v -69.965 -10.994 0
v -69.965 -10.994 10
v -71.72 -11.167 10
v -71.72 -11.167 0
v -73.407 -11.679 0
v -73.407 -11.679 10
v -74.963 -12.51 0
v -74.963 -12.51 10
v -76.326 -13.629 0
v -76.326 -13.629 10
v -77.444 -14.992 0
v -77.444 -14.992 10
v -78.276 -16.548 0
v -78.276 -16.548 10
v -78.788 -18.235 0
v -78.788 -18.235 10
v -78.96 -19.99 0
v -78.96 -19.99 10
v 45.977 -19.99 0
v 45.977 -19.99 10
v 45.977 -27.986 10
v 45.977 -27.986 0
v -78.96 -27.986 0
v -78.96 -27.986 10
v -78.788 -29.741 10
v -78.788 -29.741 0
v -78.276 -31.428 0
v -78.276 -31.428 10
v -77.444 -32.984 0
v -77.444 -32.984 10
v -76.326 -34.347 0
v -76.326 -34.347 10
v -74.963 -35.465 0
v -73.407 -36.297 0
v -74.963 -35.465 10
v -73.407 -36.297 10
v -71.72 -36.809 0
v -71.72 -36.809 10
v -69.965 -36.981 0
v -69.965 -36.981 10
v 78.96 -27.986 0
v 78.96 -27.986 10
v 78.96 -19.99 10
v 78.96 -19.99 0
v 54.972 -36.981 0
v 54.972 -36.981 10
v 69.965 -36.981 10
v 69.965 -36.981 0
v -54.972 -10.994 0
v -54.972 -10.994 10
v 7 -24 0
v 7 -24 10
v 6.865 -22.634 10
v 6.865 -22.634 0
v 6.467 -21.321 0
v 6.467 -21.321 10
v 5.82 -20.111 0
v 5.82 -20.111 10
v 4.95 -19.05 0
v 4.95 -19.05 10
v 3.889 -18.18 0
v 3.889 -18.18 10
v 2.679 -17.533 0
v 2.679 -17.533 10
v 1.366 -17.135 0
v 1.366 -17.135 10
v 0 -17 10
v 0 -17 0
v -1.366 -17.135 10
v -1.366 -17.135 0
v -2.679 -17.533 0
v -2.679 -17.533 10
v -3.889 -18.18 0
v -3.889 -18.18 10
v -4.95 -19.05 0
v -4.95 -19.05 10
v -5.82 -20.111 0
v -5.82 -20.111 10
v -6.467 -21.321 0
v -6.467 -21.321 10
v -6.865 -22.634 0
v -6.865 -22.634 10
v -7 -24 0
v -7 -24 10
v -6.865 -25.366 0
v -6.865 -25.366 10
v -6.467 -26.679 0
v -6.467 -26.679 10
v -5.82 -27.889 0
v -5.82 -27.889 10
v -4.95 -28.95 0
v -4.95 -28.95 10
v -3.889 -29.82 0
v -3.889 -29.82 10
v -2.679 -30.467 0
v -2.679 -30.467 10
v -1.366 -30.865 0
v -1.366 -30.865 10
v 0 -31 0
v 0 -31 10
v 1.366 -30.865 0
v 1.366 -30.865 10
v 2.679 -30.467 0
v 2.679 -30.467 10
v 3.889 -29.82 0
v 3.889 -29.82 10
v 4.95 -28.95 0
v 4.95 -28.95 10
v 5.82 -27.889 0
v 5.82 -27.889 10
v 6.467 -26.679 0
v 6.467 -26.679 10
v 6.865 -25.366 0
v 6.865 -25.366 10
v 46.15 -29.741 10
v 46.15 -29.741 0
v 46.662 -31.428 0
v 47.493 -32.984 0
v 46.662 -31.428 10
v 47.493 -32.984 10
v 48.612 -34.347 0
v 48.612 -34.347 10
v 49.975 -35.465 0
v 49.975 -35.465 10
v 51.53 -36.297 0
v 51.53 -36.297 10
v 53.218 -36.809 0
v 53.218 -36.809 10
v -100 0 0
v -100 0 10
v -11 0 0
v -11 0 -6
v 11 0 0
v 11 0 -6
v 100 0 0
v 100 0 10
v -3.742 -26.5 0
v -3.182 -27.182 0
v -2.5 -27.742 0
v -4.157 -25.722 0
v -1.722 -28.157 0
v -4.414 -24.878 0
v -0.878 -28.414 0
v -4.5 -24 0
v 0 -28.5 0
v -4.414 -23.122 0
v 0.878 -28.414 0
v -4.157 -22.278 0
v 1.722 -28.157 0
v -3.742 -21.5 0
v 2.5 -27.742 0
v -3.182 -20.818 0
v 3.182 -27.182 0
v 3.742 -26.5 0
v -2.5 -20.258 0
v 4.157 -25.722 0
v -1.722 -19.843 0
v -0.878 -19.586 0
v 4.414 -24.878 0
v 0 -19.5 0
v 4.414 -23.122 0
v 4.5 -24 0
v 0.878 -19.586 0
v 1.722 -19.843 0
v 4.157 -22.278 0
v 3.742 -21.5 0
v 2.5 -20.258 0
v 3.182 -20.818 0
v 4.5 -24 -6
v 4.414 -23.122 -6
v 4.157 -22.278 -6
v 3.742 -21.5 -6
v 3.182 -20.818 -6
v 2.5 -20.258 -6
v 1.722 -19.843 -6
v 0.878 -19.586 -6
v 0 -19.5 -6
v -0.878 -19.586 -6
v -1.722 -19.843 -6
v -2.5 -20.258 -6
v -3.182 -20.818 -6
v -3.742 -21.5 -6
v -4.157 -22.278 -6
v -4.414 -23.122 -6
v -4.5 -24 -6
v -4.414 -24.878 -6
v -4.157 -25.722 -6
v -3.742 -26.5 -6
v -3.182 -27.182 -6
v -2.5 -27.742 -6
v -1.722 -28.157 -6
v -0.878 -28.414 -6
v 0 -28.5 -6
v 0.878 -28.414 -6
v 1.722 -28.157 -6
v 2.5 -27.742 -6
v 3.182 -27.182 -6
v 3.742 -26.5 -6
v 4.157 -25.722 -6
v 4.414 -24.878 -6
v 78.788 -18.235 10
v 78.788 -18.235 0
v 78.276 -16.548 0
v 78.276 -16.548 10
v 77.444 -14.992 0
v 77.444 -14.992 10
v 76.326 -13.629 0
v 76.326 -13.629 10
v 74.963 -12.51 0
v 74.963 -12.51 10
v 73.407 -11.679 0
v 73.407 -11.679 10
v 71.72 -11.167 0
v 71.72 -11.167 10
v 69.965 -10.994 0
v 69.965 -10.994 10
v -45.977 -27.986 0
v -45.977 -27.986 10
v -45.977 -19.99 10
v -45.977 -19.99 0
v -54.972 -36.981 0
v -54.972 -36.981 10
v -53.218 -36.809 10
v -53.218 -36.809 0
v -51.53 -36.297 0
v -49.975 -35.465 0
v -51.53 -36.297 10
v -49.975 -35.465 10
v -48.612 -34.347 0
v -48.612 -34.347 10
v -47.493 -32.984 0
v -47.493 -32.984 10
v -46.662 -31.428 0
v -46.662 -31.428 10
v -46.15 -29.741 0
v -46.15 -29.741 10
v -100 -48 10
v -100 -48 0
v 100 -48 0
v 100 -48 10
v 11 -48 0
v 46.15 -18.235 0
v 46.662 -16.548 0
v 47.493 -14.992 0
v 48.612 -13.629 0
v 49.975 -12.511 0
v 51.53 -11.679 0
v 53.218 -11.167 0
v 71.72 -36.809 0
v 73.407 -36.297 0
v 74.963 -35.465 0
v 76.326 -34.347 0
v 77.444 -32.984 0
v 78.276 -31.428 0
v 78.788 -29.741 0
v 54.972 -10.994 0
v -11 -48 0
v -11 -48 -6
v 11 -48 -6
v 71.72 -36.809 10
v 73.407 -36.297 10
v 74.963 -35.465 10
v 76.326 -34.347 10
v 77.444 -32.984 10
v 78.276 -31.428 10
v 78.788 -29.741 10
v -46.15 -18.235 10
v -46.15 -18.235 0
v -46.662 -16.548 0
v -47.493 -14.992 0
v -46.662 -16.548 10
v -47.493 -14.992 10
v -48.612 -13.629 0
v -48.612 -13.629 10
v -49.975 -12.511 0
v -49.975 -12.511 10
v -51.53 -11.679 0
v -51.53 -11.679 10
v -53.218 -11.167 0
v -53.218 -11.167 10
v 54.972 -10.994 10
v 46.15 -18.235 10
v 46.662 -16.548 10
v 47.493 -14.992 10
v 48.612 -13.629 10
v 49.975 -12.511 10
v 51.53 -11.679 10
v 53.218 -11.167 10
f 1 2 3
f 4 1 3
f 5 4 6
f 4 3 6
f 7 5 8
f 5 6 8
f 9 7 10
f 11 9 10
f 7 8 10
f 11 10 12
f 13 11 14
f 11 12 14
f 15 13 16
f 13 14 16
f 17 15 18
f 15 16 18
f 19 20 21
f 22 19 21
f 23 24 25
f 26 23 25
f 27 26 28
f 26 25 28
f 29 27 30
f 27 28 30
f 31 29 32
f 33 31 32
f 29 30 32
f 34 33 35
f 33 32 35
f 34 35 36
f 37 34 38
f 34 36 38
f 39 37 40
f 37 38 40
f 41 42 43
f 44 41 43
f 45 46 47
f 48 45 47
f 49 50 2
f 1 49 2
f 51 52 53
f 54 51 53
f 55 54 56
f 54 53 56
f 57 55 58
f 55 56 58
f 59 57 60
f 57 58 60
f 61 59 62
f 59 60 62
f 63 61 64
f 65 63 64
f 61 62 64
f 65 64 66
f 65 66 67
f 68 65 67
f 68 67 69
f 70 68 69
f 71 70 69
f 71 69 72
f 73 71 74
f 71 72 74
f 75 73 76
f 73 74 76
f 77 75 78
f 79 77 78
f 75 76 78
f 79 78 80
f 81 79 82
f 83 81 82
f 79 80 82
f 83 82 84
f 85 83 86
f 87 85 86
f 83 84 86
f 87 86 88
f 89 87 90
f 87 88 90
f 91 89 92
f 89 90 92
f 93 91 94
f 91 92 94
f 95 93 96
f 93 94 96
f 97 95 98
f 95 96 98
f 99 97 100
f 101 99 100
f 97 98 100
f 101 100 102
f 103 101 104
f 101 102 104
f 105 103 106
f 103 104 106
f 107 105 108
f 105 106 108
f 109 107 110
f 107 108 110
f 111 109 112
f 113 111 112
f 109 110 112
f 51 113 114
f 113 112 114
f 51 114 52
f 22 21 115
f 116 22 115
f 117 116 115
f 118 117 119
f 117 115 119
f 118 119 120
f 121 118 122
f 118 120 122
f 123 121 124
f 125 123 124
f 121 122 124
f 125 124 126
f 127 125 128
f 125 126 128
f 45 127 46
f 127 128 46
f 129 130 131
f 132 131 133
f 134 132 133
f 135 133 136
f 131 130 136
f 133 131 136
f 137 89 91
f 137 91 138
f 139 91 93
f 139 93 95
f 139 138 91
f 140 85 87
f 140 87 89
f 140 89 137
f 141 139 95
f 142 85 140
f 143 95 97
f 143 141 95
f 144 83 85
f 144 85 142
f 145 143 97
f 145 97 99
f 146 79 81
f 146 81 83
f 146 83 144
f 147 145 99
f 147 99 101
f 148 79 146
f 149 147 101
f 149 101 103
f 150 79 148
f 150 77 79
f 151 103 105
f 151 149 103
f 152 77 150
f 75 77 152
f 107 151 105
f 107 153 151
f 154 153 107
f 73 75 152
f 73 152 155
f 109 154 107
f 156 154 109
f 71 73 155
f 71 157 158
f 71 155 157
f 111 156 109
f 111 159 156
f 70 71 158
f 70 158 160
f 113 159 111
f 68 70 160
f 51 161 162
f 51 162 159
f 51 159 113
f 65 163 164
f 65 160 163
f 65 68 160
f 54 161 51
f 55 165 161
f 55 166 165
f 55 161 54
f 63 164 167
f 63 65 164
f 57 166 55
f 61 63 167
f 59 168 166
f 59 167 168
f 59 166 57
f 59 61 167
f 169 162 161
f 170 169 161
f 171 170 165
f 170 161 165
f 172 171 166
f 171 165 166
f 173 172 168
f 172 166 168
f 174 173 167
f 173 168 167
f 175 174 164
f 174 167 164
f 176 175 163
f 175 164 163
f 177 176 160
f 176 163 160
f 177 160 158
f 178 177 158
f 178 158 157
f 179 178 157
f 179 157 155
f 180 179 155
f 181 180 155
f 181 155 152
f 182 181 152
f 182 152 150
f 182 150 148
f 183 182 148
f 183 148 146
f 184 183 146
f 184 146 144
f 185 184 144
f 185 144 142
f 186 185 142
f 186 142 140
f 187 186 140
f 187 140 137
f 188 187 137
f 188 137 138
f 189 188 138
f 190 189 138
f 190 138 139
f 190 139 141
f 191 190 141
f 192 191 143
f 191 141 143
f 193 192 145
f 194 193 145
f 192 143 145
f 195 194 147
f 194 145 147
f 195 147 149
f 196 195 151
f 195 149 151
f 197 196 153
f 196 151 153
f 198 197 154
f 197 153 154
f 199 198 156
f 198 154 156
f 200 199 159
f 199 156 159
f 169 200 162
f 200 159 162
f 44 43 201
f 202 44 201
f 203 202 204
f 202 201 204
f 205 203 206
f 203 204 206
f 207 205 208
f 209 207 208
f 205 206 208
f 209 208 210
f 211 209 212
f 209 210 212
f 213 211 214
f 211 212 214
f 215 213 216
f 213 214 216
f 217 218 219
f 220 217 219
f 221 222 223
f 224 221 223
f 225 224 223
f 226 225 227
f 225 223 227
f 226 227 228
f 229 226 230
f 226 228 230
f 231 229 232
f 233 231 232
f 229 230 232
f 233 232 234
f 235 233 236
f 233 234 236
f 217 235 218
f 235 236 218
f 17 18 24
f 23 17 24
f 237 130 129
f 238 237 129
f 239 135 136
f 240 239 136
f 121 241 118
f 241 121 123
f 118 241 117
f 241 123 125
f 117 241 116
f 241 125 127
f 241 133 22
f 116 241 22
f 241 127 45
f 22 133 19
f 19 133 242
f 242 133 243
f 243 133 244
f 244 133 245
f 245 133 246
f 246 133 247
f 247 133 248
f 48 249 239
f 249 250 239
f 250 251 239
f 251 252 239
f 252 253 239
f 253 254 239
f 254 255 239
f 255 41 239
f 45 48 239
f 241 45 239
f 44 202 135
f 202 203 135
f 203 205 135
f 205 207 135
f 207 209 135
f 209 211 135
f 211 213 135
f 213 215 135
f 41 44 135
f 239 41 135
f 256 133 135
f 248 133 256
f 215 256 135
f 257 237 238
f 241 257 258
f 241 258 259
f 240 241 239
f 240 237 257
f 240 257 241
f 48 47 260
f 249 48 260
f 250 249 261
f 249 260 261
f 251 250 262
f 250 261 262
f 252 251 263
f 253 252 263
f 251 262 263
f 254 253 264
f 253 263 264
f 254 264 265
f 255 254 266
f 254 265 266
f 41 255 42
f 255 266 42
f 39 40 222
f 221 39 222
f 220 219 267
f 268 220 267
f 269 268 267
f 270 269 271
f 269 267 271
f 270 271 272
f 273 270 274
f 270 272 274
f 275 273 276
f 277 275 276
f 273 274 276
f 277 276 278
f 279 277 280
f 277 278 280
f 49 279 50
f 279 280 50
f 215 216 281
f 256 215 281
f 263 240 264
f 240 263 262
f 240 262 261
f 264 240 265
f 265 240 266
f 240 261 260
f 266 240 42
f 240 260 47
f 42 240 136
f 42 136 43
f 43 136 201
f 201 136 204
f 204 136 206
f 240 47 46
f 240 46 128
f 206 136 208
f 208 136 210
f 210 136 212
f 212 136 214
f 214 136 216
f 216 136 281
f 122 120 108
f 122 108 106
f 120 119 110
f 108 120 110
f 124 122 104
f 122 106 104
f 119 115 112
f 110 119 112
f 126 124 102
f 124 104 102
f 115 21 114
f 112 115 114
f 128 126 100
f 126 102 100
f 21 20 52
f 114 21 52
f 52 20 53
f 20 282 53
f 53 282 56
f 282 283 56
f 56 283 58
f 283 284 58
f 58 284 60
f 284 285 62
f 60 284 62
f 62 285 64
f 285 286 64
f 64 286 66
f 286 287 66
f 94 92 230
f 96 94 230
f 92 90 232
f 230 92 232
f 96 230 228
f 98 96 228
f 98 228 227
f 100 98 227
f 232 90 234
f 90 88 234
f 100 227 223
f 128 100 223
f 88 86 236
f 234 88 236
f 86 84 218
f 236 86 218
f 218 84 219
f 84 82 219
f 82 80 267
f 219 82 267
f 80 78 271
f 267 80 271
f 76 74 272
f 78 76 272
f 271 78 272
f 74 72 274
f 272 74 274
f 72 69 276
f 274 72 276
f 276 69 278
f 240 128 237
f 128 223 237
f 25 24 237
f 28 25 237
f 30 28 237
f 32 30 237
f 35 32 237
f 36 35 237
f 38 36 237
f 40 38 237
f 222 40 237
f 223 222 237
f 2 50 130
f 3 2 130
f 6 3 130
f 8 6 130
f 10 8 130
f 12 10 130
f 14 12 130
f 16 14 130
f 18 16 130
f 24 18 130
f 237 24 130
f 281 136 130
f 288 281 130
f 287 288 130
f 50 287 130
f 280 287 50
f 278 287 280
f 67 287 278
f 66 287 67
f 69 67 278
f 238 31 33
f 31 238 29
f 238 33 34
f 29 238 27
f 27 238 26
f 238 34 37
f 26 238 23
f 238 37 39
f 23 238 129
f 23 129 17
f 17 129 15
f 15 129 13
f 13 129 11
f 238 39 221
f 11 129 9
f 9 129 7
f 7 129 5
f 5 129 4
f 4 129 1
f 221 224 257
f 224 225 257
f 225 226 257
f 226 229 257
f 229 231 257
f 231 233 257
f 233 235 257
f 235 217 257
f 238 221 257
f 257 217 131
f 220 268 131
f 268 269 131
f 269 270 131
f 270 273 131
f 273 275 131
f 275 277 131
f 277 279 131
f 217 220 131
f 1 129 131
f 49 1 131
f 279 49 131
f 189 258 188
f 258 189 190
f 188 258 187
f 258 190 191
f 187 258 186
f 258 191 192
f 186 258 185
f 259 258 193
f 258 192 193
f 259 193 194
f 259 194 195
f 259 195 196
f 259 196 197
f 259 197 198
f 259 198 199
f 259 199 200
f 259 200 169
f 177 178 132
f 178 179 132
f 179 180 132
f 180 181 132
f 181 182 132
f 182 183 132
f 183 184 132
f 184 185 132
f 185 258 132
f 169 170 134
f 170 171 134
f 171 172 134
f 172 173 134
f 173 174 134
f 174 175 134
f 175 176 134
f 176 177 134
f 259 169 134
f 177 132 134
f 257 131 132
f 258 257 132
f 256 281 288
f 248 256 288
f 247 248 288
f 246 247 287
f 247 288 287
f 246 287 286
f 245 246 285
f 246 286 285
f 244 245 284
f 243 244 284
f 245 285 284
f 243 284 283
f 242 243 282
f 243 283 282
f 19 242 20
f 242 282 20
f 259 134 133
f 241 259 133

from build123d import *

# Parameters (mm, degrees)
F1_DEPTH = 48
F3_DEPTH = 10
F2_R     = 7
F2_R_2   = 4.5
F4_DEPTH = 10
F5_DEPTH = 25


with BuildPart() as f1:
    # F0 (on Front) → F1 (new body)
    with BuildSketch(Plane.XZ):
        Polygon((-100, 0), (-11, 0), (-11, -6), (11, -6), (11, 0), (100, 0), (100, 10), (-100, 10), align=None)
    extrude(amount=F1_DEPTH)

    # F2 (on face) → F3 (cut)
    with BuildSketch(Plane.XY.offset(10)):
        with BuildLine():
            Line((-78.960404, -19.989976), (-78.960404, -27.985966))
            ThreePointArc((-78.960404, -27.985966), (-76.325687, -34.346737), (-69.964915, -36.981455))
            Line((-69.964915, -36.981455), (-54.972433, -36.981455))
            ThreePointArc((-54.972433, -36.981455), (-48.611662, -34.346737), (-45.976944, -27.985966))
            Line((-45.976944, -27.985966), (-45.976944, -19.989976))
            ThreePointArc((-45.976944, -19.989976), (-48.611662, -13.629204), (-54.972433, -10.994487))
            Line((-54.972433, -10.994487), (-69.964915, -10.994487))
            ThreePointArc((-69.964915, -10.994487), (-76.325687, -13.629204), (-78.960404, -19.989976))
        make_face()
        with BuildLine():
            ThreePointArc((45.976944, -27.985966), (48.611662, -34.346737), (54.972433, -36.981455))
            Line((54.972433, -36.981455), (69.964915, -36.981455))
            ThreePointArc((69.964915, -36.981455), (76.325687, -34.346737), (78.960404, -27.985966))
            Line((78.960404, -27.985966), (78.960404, -19.989976))
            ThreePointArc((78.960404, -19.989976), (76.325687, -13.629204), (69.964915, -10.994487))
            Line((69.964915, -10.994487), (54.972433, -10.994487))
            ThreePointArc((54.972433, -10.994487), (48.611662, -13.629204), (45.976944, -19.989976))
            Line((45.976944, -19.989976), (45.976944, -27.985966))
        make_face()
    extrude(amount=-F3_DEPTH, mode=Mode.SUBTRACT)

    # F2 (on face) → F4 (cut)
    with BuildSketch(Plane.XY.offset(10)):
        with Locations((0, -24)):
            Circle(F2_R)
        with Locations((0, -24)):
            Circle(F2_R_2, mode=Mode.SUBTRACT)
    extrude(amount=-F4_DEPTH, mode=Mode.SUBTRACT)

    # F2 (on face) → F5 (cut)
    with BuildSketch(Plane.XY.offset(10)):
        with Locations((0, -24)):
            Circle(F2_R_2)
    extrude(amount=-F5_DEPTH, mode=Mode.SUBTRACT)


solid = f1.part
